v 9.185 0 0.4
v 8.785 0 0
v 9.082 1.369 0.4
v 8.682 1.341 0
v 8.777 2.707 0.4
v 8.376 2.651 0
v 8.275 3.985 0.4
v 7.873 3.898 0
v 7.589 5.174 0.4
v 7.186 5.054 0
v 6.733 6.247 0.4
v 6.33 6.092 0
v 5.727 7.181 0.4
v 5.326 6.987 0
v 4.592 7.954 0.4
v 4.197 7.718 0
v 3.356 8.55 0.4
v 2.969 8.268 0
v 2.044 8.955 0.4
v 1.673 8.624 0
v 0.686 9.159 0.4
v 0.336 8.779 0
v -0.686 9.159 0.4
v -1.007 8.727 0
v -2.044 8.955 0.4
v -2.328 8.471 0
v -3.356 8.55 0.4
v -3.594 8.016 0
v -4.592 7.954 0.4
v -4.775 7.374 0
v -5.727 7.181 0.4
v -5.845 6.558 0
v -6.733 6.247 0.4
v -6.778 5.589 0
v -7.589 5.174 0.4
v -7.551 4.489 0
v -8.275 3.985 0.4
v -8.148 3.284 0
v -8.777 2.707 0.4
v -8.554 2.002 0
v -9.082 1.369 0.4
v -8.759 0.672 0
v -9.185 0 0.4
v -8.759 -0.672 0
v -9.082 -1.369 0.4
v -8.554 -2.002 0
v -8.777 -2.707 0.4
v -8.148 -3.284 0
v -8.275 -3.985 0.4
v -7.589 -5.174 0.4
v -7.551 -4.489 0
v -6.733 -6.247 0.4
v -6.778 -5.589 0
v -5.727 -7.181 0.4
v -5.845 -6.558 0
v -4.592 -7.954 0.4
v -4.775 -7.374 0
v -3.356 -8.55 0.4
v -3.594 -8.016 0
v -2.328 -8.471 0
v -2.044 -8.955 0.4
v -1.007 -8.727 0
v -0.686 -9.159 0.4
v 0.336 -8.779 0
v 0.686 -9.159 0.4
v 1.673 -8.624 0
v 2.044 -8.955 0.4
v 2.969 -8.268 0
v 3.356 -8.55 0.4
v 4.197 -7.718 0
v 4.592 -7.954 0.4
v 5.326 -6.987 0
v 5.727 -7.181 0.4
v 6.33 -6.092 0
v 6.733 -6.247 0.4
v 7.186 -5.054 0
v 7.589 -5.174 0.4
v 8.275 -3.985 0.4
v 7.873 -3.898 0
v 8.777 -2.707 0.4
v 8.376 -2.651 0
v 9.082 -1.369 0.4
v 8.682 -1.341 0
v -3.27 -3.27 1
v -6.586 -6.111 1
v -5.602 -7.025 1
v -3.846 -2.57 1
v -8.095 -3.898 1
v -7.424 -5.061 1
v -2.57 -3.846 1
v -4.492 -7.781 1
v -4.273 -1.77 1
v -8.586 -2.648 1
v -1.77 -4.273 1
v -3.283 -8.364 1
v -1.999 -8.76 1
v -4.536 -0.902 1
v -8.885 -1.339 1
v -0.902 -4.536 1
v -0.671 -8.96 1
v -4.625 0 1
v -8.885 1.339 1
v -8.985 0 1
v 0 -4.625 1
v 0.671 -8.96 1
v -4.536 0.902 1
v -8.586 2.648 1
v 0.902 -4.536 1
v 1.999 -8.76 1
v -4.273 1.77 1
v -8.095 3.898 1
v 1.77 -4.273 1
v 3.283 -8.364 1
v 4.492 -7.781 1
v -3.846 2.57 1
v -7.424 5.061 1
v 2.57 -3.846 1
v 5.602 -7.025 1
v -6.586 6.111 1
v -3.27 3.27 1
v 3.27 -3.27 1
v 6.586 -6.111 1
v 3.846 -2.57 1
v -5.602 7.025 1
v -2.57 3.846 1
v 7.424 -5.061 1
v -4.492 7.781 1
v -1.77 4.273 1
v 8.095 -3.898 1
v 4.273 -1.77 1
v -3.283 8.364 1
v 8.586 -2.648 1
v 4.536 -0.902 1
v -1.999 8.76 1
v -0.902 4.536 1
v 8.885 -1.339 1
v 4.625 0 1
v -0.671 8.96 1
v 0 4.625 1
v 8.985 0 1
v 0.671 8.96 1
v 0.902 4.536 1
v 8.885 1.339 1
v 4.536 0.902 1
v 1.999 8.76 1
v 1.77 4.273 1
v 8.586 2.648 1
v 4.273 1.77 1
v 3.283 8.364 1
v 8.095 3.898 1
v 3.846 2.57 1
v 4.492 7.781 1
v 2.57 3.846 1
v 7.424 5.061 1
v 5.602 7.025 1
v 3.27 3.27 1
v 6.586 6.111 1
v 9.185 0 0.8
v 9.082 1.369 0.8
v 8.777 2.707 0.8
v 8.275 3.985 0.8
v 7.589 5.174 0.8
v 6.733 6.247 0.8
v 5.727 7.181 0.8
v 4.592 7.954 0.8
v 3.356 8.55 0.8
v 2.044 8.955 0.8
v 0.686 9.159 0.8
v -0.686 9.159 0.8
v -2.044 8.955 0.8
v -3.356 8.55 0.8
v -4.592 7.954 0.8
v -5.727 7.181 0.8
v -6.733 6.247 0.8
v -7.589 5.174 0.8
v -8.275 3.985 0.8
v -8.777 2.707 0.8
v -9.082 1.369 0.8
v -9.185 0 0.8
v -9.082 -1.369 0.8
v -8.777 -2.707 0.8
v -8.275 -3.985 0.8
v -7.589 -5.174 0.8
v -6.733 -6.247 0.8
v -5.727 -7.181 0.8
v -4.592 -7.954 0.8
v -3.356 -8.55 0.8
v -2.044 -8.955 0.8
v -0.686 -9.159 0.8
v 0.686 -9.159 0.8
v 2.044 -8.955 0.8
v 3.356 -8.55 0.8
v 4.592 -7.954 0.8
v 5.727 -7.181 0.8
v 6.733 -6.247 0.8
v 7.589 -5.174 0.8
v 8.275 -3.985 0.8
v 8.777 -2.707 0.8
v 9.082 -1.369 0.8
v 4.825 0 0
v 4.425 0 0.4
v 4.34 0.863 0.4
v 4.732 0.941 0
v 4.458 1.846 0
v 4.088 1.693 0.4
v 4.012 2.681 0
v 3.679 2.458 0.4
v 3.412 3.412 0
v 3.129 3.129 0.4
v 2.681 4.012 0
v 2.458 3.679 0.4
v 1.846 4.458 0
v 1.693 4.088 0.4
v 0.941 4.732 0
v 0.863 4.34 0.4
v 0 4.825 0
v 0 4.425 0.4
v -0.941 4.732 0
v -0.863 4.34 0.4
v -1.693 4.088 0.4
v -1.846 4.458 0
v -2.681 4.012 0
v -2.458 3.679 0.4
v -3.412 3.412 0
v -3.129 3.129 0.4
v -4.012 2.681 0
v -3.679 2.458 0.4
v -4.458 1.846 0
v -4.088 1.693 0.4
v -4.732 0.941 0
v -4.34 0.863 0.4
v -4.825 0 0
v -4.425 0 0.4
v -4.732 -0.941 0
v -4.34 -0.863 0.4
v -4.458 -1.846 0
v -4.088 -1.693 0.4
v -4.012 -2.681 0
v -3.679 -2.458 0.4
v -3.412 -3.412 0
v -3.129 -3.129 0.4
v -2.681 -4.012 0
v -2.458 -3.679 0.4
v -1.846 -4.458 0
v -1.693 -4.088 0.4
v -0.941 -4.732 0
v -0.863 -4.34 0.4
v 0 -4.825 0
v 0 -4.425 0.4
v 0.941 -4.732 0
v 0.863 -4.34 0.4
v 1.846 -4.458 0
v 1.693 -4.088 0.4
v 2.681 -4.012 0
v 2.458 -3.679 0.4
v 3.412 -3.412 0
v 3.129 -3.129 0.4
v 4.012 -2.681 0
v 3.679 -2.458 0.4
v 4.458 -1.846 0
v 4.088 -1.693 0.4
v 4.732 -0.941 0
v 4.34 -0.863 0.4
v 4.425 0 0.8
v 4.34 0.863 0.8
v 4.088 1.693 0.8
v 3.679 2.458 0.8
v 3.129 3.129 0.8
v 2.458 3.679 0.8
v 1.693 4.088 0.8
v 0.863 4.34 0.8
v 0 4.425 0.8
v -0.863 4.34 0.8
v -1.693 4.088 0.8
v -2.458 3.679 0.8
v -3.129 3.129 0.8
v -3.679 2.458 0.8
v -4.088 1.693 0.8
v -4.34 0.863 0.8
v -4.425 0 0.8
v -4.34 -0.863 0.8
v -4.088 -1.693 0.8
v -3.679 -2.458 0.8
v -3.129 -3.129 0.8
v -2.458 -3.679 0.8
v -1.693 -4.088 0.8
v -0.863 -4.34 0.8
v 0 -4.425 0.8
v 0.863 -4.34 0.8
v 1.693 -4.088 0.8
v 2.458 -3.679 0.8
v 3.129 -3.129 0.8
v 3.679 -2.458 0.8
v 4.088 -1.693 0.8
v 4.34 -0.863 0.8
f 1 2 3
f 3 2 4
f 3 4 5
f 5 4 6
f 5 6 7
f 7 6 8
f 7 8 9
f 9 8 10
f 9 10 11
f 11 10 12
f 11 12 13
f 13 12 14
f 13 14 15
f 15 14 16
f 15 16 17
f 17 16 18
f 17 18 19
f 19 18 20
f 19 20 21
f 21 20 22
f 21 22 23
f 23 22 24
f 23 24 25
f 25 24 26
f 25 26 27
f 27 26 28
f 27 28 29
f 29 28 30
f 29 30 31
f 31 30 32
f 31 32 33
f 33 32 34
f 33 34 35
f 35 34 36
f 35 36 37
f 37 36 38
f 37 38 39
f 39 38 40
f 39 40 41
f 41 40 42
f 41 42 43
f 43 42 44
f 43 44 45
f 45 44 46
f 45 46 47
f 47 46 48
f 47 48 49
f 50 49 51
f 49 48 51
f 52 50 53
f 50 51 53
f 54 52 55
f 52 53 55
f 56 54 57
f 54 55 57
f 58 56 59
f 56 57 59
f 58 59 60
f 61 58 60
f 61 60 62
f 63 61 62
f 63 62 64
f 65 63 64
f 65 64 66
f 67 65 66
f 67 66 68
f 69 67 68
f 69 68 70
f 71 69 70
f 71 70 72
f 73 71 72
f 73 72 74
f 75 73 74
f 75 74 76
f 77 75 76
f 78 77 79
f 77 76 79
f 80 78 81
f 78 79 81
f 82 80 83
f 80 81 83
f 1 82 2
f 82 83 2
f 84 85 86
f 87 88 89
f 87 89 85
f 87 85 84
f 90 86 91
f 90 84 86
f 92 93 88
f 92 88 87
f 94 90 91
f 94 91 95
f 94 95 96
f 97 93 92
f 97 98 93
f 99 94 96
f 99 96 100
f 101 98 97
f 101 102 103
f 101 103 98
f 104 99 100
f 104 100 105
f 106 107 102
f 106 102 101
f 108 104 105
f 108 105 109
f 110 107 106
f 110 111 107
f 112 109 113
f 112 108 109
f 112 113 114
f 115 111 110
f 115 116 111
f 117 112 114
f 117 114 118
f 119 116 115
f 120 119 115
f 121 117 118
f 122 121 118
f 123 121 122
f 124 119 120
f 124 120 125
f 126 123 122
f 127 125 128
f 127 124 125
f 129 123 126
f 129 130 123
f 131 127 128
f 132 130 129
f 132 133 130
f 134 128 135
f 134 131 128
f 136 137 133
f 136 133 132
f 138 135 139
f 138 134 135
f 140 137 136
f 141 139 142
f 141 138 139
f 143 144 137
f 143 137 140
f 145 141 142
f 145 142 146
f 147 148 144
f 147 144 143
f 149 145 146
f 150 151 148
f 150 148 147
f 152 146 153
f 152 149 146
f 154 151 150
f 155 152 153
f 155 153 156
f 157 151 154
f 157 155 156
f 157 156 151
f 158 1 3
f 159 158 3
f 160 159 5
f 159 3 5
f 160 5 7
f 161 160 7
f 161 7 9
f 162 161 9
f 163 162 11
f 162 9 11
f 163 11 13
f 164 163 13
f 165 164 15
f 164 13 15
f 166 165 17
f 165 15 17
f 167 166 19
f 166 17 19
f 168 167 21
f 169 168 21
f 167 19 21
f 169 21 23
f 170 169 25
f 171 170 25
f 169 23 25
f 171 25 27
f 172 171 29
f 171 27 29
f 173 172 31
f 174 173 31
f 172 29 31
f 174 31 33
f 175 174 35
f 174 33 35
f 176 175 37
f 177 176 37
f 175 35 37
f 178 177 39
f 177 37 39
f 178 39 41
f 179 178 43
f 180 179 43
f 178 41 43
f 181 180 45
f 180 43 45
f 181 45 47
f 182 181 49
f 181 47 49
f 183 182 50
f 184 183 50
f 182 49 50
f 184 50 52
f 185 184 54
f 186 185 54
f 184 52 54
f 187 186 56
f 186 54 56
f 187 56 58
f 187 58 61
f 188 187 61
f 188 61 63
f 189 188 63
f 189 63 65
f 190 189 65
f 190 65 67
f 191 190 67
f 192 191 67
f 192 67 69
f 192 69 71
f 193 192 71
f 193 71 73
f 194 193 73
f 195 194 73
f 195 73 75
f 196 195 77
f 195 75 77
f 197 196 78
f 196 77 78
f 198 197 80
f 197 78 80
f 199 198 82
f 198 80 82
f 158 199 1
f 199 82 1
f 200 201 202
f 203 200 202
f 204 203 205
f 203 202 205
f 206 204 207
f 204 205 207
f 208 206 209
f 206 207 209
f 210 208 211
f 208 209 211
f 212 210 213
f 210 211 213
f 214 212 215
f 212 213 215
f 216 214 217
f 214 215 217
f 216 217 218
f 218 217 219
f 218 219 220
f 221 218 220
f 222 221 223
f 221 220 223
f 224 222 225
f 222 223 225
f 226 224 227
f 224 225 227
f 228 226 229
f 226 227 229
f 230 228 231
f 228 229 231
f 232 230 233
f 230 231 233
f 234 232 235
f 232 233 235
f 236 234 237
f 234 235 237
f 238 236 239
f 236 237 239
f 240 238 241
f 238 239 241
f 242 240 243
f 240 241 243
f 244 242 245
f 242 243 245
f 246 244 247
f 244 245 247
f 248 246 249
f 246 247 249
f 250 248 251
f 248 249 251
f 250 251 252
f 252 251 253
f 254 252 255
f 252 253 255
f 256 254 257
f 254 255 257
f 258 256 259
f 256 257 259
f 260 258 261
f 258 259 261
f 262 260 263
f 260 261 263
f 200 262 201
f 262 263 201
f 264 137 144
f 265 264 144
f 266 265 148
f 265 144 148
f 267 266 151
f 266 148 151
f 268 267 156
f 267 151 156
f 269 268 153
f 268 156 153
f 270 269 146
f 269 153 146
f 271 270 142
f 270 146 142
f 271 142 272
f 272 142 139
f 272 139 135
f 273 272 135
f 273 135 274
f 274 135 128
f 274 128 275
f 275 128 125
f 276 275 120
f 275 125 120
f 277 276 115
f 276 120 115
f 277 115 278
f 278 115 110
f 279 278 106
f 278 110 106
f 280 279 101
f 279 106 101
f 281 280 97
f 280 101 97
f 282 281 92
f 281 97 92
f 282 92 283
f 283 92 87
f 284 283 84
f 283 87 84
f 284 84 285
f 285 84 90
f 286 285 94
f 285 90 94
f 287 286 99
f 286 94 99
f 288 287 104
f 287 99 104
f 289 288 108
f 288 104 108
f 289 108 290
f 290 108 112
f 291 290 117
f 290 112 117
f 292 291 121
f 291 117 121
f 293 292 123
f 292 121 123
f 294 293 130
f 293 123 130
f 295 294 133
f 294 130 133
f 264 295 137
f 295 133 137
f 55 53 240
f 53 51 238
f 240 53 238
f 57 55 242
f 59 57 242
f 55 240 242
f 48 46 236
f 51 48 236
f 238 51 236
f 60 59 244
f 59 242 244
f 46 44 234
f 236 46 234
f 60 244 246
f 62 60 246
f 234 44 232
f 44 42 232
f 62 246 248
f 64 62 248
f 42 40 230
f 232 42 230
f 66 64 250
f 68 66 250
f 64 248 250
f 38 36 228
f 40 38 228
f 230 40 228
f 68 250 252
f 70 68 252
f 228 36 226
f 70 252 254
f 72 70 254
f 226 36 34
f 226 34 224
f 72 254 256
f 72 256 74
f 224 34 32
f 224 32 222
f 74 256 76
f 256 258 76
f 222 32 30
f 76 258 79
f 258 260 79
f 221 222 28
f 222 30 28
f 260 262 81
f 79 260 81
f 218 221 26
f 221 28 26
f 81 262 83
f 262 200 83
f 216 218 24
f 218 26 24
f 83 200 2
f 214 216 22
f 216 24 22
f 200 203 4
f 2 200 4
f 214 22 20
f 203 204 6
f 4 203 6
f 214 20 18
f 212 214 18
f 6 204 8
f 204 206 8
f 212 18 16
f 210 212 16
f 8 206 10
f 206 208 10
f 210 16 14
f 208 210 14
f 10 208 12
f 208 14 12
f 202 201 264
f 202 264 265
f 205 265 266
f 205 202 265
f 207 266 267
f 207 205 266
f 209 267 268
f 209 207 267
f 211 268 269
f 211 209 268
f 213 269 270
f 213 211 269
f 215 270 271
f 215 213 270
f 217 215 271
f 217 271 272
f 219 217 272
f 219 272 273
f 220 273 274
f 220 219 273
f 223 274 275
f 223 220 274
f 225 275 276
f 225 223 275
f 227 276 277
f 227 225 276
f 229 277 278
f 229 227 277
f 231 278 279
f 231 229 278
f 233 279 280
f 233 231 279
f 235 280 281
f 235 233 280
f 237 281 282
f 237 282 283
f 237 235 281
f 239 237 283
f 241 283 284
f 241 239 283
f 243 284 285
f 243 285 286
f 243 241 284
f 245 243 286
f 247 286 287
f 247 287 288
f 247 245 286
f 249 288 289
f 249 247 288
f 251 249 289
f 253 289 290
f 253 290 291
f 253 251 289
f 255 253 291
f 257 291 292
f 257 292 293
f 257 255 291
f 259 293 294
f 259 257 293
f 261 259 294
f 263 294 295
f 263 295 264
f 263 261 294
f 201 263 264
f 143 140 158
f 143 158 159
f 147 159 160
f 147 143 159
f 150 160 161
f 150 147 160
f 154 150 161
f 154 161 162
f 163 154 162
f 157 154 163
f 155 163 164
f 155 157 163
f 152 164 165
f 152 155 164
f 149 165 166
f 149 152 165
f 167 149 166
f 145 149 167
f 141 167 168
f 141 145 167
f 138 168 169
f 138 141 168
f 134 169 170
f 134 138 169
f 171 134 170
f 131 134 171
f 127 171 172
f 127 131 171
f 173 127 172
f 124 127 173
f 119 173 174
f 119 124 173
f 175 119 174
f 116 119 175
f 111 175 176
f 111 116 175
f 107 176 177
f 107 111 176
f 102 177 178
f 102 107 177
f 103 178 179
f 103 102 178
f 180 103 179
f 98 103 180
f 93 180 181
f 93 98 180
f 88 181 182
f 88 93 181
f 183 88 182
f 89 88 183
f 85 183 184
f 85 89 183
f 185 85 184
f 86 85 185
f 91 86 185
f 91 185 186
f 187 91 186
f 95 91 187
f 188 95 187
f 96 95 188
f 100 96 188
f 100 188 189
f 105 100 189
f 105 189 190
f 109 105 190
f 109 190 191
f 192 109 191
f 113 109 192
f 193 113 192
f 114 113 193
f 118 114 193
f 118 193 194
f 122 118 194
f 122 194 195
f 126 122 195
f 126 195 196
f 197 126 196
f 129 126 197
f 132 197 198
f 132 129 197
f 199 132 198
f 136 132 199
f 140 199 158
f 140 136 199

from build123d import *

# Parameters (mm, degrees)
F1_R     = 9.185
F1_R_2   = 4.425
F2_DEPTH = 1
F5_SIZE  = 0.4
F6_SIZE  = 0.2
F7_SIZE  = 0.4
F8_SIZE  = 0.2


with BuildPart() as f2:
    # F1 (on Top) → F2 (new body)
    with BuildSketch(Plane.XY):
        Circle(F1_R)
        Circle(F1_R_2, mode=Mode.SUBTRACT)
    extrude(amount=F2_DEPTH)

    # F5
    f5_edges = [f2.edges().sort_by_distance(p)[0] for p in [
        (-9.185, 0, 0),
    ]]
    chamfer(f5_edges, length=F5_SIZE)

    # F6
    f6_edges = [f2.edges().sort_by_distance(p)[0] for p in [
        (-9.185, 0, 1),
    ]]
    chamfer(f6_edges, length=F6_SIZE)

    # F7
    f7_edges = [f2.edges().sort_by_distance(p)[0] for p in [
        (-4.425, 0, 0),
    ]]
    chamfer(f7_edges, length=F7_SIZE)

    # F8
    f8_edges = [f2.edges().sort_by_distance(p)[0] for p in [
        (-4.425, 0, 1),
    ]]
    chamfer(f8_edges, length=F8_SIZE)


solid = f2.part
